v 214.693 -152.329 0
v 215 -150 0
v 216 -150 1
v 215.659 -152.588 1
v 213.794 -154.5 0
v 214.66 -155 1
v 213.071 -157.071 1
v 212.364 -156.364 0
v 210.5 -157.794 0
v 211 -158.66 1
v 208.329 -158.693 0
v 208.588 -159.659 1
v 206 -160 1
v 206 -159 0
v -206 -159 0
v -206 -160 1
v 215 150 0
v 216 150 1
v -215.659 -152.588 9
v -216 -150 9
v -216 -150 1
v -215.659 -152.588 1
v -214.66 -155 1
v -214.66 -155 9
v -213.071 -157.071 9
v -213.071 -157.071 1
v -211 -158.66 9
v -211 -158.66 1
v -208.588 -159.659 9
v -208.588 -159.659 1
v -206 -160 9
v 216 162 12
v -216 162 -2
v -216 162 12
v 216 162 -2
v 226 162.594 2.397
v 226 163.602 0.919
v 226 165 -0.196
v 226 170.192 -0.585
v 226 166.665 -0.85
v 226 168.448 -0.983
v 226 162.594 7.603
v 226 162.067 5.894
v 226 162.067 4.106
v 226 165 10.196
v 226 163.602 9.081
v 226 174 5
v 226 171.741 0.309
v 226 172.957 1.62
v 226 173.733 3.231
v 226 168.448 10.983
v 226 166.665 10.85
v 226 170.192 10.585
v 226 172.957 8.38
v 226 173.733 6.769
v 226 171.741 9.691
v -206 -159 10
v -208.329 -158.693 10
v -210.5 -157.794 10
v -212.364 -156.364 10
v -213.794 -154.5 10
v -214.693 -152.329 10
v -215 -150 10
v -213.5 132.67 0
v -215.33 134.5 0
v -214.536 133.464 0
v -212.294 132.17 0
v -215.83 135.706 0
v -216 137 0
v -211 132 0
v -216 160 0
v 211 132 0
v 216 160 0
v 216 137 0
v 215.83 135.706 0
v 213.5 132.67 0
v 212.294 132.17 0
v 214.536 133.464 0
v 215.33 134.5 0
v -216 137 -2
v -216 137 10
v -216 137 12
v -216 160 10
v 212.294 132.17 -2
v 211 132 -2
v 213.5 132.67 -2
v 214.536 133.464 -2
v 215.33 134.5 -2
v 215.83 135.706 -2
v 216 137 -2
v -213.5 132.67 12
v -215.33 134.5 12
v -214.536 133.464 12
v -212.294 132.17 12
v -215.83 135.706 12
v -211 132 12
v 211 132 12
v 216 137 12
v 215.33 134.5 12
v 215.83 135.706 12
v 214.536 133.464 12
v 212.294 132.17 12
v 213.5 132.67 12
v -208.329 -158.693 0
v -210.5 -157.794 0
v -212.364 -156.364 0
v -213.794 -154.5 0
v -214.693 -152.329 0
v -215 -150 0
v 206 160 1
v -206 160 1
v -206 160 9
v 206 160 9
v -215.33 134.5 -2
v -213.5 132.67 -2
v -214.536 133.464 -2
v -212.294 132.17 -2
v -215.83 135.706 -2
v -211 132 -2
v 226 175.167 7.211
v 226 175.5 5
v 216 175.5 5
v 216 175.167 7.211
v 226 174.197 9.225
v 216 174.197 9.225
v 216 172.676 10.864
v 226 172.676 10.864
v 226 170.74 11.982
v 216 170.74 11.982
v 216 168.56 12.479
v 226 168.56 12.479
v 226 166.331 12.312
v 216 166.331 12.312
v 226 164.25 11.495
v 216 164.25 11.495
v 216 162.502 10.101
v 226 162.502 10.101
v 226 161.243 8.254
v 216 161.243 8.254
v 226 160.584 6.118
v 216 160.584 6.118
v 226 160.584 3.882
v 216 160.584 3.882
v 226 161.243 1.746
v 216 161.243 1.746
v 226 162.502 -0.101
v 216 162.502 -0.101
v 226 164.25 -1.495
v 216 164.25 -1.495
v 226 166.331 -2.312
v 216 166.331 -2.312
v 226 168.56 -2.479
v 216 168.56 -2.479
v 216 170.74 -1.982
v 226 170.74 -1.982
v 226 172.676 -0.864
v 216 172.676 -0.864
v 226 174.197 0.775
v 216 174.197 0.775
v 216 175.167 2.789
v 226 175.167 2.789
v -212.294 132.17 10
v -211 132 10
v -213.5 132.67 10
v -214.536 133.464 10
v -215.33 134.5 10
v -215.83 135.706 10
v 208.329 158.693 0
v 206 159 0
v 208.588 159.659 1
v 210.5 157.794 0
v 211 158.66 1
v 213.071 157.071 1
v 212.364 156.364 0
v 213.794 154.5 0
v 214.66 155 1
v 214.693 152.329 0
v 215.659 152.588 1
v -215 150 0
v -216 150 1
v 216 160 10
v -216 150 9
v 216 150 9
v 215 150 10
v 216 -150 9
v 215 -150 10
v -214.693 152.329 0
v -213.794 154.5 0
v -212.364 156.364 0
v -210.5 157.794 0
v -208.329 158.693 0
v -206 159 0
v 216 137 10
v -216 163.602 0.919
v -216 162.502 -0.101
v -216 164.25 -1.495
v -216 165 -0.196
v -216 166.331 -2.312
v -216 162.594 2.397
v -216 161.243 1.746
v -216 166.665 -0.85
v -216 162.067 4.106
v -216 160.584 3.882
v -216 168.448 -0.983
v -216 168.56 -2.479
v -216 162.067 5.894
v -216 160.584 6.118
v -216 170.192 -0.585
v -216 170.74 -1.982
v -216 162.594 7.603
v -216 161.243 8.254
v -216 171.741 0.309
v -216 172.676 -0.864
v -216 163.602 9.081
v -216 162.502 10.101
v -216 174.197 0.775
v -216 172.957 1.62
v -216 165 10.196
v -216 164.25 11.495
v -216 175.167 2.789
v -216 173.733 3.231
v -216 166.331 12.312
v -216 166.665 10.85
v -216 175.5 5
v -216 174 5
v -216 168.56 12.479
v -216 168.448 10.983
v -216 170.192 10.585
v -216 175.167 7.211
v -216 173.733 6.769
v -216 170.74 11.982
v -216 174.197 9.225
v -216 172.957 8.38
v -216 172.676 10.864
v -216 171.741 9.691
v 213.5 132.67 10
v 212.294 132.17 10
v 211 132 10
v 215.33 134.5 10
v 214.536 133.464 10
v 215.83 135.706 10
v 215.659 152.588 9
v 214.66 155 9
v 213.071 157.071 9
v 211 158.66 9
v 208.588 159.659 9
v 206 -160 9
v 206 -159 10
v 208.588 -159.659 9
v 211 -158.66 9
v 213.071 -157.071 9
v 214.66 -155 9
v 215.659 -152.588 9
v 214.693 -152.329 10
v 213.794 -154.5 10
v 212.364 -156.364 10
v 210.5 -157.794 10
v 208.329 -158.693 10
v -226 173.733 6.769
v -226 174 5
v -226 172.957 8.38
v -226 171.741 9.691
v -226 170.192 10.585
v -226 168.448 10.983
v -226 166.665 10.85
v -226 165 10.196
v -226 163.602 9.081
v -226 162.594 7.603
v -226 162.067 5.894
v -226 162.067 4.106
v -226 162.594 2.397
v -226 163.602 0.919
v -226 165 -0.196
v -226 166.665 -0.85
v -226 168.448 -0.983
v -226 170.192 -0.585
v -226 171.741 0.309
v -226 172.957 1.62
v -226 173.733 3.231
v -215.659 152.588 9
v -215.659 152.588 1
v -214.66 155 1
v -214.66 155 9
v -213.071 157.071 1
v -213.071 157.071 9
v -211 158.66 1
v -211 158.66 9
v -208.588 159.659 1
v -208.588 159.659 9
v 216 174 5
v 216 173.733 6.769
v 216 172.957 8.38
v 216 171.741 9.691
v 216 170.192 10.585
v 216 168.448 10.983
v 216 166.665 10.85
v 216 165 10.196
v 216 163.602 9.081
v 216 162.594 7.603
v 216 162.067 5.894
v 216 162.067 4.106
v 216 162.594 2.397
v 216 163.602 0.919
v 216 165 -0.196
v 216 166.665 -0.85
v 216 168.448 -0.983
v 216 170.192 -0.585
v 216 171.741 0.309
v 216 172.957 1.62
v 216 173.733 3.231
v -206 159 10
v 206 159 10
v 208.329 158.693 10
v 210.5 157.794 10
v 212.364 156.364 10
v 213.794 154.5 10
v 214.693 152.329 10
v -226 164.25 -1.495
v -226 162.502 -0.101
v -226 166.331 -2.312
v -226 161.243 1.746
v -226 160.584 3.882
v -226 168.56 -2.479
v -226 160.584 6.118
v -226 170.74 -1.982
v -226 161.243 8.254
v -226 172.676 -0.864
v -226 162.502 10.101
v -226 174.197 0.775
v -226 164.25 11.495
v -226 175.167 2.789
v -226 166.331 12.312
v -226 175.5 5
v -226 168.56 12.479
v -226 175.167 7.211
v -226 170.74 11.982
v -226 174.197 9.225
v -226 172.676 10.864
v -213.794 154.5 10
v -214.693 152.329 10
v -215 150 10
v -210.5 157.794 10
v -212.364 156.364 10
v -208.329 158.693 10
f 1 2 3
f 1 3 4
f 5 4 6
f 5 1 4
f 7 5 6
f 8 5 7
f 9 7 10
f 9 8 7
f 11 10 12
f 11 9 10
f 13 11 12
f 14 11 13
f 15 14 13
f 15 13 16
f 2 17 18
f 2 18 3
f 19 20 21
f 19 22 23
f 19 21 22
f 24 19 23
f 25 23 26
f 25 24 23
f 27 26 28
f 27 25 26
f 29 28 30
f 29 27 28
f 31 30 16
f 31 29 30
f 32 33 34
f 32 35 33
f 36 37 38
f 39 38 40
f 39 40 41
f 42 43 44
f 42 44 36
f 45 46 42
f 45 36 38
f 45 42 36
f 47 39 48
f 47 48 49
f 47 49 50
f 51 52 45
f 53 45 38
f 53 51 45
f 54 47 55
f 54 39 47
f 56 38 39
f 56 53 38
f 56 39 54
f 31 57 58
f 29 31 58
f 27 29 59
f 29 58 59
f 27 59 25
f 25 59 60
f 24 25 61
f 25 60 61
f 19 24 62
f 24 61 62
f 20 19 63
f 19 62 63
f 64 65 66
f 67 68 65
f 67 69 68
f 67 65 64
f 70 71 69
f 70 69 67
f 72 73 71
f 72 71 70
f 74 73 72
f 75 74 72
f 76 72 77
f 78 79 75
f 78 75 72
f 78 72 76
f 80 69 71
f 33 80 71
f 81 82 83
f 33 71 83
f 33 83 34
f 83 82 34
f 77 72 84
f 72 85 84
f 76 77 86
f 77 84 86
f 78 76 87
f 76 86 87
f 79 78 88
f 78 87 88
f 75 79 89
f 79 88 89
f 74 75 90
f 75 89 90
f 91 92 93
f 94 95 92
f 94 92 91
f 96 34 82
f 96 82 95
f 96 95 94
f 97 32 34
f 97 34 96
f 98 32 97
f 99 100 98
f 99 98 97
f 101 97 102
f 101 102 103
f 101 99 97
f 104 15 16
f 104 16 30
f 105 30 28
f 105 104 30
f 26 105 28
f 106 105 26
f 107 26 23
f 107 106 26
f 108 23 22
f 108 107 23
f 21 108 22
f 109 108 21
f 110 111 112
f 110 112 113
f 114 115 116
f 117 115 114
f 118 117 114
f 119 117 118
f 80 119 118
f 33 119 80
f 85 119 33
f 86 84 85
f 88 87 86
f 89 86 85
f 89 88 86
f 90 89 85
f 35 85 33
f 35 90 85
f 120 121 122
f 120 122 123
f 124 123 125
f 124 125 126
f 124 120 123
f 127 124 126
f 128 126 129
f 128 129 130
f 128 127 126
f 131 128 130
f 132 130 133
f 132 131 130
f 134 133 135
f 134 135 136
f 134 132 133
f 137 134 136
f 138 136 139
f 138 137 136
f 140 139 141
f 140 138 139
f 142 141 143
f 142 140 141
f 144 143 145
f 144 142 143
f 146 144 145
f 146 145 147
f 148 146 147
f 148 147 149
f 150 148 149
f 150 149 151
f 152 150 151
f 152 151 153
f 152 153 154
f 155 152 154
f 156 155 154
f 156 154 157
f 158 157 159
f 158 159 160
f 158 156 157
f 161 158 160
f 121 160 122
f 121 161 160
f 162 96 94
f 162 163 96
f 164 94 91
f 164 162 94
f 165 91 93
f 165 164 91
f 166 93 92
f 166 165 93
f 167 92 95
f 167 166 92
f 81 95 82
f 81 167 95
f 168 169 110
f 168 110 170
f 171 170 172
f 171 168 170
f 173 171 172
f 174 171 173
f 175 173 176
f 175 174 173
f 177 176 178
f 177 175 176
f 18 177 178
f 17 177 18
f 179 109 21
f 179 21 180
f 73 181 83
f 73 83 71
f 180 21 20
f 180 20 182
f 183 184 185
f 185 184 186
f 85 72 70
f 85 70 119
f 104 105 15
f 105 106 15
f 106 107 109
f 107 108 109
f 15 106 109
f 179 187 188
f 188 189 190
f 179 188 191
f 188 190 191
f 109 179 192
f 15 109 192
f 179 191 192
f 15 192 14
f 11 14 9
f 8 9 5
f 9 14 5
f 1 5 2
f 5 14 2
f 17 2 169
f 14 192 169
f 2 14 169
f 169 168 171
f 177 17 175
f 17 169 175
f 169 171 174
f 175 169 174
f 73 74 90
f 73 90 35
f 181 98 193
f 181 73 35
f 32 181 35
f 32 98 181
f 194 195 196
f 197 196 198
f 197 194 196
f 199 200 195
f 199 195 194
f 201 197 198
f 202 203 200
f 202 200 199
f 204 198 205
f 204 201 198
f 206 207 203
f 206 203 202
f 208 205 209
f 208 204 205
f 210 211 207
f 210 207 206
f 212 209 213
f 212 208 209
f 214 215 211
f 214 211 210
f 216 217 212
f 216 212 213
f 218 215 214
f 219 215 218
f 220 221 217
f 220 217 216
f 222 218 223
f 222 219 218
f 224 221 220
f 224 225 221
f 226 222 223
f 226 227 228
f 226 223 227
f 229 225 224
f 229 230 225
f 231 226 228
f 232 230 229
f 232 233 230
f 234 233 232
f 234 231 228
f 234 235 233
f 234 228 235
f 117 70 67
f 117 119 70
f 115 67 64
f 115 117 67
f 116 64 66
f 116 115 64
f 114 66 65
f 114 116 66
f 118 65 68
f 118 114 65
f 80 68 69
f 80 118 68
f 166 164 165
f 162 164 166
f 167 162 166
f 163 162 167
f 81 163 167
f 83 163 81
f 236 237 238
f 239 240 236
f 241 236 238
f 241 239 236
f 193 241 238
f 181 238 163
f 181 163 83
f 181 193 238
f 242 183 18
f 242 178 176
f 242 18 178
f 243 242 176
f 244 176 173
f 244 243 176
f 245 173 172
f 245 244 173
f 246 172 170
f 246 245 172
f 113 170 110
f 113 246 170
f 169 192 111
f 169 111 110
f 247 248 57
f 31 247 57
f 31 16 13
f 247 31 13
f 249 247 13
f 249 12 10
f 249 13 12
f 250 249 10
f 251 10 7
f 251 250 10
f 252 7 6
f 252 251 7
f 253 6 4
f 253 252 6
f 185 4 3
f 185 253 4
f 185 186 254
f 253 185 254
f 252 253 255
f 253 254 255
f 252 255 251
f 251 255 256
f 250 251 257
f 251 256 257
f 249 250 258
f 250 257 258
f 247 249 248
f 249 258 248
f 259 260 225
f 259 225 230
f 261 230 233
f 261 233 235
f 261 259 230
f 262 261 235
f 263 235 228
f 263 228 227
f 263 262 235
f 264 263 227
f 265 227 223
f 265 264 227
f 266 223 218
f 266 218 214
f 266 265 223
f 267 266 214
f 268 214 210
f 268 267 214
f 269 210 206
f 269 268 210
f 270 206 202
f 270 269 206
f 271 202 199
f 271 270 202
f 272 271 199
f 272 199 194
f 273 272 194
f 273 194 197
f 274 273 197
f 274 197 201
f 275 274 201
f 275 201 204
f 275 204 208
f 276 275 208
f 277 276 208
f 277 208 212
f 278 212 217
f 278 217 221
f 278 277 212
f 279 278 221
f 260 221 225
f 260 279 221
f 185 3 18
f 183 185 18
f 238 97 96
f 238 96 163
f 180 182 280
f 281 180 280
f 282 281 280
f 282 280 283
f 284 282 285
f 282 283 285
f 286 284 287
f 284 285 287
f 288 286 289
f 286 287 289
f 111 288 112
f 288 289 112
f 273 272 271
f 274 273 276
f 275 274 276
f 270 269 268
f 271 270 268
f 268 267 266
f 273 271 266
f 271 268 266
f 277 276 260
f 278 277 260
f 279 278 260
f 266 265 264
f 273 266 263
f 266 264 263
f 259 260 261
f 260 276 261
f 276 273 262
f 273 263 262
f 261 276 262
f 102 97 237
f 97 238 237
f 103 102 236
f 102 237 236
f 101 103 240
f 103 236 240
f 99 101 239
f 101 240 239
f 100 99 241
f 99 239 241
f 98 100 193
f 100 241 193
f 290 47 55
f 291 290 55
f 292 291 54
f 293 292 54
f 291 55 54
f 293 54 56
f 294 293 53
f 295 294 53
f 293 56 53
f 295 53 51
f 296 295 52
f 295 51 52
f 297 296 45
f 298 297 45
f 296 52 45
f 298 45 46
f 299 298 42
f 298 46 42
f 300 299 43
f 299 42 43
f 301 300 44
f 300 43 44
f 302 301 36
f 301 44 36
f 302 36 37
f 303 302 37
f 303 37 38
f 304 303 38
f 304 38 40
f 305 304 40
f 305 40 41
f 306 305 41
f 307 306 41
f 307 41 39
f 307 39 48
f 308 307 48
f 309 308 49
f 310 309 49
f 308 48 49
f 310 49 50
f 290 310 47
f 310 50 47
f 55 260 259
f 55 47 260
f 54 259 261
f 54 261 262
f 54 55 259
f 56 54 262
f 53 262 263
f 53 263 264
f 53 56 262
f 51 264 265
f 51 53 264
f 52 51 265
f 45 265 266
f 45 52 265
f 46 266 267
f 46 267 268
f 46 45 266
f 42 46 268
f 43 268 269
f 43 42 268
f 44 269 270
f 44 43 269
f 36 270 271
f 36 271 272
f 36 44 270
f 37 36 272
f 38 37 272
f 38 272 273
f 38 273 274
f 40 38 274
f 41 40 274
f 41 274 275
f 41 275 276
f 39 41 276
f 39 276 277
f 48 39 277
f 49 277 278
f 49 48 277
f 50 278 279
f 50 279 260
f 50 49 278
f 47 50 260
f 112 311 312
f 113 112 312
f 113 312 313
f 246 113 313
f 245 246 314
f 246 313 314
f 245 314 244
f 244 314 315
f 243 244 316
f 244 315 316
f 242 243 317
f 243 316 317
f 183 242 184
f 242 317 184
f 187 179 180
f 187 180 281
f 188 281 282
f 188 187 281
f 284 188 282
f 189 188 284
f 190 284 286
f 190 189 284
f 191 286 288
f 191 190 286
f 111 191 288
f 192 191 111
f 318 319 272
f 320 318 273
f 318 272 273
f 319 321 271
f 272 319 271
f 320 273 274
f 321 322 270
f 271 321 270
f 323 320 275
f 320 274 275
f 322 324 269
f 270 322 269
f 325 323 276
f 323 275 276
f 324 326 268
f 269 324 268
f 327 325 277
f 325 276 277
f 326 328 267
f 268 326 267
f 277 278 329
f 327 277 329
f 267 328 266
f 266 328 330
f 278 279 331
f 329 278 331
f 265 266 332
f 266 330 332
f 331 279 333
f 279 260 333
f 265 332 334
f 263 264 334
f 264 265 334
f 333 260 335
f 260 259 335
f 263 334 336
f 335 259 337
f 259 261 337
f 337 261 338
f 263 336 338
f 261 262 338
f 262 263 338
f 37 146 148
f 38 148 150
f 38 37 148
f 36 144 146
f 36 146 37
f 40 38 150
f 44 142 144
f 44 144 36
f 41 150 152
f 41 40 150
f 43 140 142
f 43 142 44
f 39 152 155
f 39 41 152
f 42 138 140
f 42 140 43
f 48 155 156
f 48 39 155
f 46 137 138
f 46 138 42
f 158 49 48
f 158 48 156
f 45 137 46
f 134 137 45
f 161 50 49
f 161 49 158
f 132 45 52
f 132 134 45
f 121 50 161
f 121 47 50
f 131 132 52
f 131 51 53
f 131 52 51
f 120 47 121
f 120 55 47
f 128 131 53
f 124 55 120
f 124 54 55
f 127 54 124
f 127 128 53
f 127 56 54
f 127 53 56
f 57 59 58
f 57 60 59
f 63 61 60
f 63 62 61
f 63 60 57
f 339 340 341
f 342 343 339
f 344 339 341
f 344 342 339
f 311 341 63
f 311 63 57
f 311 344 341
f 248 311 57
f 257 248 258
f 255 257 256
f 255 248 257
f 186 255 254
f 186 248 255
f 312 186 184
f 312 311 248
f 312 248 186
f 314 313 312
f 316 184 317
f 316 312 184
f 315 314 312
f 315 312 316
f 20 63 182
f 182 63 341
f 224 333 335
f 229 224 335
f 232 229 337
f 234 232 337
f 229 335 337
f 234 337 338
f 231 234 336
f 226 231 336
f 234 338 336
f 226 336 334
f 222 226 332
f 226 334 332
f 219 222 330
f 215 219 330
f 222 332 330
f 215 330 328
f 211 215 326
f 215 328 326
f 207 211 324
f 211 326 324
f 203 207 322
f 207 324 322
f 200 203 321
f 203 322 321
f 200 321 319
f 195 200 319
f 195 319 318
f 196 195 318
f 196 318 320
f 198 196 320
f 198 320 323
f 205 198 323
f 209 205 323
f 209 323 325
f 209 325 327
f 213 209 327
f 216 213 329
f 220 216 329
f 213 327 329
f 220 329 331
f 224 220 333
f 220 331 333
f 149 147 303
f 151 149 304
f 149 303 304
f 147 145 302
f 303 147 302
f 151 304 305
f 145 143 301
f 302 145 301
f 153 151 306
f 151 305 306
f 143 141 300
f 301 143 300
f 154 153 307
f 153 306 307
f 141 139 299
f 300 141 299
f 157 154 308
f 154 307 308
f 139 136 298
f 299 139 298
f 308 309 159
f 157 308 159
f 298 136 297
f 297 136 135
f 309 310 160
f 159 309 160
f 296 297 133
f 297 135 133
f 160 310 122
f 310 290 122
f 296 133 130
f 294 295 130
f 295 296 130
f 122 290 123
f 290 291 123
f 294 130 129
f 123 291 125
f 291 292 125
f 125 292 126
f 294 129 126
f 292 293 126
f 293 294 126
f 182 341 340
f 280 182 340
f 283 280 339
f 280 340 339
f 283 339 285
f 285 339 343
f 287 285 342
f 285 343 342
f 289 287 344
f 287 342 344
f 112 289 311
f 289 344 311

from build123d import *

# Parameters (mm, degrees)
F0_W     = 432
F0_H     = 320
F1_DEPTH = 10
F2_R     = 10
F4_DEPTH = 216
F5_R     = 6
F6_DEPTH = 226
F7_R     = 7.5
F7_R_2   = 6
F8_DEPTH = 10
F10_SIZE = 1
F11_R    = 5


with BuildPart() as f1:
    # F0 (on Top) → F1 (new body)
    with BuildSketch(Plane.XY):
        Rectangle(F0_W, F0_H)
    extrude(amount=F1_DEPTH)

    # F2
    f2_edges = [f1.edges().sort_by_distance(p)[0] for p in [
        (216, -160, 5),
        (-216, -160, 5),
        (216, 160, 5),
        (-216, 160, 5),
    ]]
    fillet(f2_edges, radius=F2_R)

    # F10
    f10_edges = [f1.edges().sort_by_distance(p)[0] for p in [
        (-216, 0, 10),
        (-213.071068, 157.071068, 10),
        (-213.071068, -157.071068, 10),
        (0, 160, 10),
        (0, -160, 10),
        (213.071068, 157.071068, 10),
        (213.071068, -157.071068, 10),
        (216, 0, 10),
        (-216, 0, 0),
        (-213.071068, 157.071068, 0),
        (-213.071068, -157.071068, 0),
        (0, 160, 0),
        (0, -160, 0),
        (213.071068, 157.071068, 0),
        (213.071068, -157.071068, 0),
        (216, 0, 0),
    ]]
    chamfer(f10_edges, length=F10_SIZE)


with BuildPart() as f4:
    # F3 (on Right) → F4 (new body, symmetric)
    with BuildSketch(Plane.YZ):
        Polygon((132, 12), (132, 10), (160, 10), (160, 0), (132, 0), (132, -2), (162, -2), (162, 12), align=None)
    extrude(amount=F4_DEPTH, both=True)

    # F11
    f11_edges = [f4.edges().sort_by_distance(p)[0] for p in [
        (-216, 132, 11),
        (-216, 132, -1),
        (216, 132, 11),
        (216, 132, -1),
    ]]
    fillet(f11_edges, radius=F11_R)


with BuildPart() as f6:
    # F5 (on Right) → F6 (new body, symmetric)
    with BuildSketch(Plane.YZ):
        with Locations((168, 5)):
            Circle(F5_R)
    extrude(amount=F6_DEPTH, both=True)


with BuildPart() as f8:
    # F7 (on face) → F8 (new body)
    with BuildSketch(Plane.YZ.offset(226)):
        with Locations((168, 5)):
            Circle(F7_R)
        with Locations((168, 5)):
            Circle(F7_R_2, mode=Mode.SUBTRACT)
    extrude(amount=-F8_DEPTH)


with BuildPart() as f9_1:
    # F9: instance of F8
    add(f8.part.mirror(Plane.YZ))


solid = Compound([f1.part, f4.part, f6.part, f8.part, f9_1.part])
